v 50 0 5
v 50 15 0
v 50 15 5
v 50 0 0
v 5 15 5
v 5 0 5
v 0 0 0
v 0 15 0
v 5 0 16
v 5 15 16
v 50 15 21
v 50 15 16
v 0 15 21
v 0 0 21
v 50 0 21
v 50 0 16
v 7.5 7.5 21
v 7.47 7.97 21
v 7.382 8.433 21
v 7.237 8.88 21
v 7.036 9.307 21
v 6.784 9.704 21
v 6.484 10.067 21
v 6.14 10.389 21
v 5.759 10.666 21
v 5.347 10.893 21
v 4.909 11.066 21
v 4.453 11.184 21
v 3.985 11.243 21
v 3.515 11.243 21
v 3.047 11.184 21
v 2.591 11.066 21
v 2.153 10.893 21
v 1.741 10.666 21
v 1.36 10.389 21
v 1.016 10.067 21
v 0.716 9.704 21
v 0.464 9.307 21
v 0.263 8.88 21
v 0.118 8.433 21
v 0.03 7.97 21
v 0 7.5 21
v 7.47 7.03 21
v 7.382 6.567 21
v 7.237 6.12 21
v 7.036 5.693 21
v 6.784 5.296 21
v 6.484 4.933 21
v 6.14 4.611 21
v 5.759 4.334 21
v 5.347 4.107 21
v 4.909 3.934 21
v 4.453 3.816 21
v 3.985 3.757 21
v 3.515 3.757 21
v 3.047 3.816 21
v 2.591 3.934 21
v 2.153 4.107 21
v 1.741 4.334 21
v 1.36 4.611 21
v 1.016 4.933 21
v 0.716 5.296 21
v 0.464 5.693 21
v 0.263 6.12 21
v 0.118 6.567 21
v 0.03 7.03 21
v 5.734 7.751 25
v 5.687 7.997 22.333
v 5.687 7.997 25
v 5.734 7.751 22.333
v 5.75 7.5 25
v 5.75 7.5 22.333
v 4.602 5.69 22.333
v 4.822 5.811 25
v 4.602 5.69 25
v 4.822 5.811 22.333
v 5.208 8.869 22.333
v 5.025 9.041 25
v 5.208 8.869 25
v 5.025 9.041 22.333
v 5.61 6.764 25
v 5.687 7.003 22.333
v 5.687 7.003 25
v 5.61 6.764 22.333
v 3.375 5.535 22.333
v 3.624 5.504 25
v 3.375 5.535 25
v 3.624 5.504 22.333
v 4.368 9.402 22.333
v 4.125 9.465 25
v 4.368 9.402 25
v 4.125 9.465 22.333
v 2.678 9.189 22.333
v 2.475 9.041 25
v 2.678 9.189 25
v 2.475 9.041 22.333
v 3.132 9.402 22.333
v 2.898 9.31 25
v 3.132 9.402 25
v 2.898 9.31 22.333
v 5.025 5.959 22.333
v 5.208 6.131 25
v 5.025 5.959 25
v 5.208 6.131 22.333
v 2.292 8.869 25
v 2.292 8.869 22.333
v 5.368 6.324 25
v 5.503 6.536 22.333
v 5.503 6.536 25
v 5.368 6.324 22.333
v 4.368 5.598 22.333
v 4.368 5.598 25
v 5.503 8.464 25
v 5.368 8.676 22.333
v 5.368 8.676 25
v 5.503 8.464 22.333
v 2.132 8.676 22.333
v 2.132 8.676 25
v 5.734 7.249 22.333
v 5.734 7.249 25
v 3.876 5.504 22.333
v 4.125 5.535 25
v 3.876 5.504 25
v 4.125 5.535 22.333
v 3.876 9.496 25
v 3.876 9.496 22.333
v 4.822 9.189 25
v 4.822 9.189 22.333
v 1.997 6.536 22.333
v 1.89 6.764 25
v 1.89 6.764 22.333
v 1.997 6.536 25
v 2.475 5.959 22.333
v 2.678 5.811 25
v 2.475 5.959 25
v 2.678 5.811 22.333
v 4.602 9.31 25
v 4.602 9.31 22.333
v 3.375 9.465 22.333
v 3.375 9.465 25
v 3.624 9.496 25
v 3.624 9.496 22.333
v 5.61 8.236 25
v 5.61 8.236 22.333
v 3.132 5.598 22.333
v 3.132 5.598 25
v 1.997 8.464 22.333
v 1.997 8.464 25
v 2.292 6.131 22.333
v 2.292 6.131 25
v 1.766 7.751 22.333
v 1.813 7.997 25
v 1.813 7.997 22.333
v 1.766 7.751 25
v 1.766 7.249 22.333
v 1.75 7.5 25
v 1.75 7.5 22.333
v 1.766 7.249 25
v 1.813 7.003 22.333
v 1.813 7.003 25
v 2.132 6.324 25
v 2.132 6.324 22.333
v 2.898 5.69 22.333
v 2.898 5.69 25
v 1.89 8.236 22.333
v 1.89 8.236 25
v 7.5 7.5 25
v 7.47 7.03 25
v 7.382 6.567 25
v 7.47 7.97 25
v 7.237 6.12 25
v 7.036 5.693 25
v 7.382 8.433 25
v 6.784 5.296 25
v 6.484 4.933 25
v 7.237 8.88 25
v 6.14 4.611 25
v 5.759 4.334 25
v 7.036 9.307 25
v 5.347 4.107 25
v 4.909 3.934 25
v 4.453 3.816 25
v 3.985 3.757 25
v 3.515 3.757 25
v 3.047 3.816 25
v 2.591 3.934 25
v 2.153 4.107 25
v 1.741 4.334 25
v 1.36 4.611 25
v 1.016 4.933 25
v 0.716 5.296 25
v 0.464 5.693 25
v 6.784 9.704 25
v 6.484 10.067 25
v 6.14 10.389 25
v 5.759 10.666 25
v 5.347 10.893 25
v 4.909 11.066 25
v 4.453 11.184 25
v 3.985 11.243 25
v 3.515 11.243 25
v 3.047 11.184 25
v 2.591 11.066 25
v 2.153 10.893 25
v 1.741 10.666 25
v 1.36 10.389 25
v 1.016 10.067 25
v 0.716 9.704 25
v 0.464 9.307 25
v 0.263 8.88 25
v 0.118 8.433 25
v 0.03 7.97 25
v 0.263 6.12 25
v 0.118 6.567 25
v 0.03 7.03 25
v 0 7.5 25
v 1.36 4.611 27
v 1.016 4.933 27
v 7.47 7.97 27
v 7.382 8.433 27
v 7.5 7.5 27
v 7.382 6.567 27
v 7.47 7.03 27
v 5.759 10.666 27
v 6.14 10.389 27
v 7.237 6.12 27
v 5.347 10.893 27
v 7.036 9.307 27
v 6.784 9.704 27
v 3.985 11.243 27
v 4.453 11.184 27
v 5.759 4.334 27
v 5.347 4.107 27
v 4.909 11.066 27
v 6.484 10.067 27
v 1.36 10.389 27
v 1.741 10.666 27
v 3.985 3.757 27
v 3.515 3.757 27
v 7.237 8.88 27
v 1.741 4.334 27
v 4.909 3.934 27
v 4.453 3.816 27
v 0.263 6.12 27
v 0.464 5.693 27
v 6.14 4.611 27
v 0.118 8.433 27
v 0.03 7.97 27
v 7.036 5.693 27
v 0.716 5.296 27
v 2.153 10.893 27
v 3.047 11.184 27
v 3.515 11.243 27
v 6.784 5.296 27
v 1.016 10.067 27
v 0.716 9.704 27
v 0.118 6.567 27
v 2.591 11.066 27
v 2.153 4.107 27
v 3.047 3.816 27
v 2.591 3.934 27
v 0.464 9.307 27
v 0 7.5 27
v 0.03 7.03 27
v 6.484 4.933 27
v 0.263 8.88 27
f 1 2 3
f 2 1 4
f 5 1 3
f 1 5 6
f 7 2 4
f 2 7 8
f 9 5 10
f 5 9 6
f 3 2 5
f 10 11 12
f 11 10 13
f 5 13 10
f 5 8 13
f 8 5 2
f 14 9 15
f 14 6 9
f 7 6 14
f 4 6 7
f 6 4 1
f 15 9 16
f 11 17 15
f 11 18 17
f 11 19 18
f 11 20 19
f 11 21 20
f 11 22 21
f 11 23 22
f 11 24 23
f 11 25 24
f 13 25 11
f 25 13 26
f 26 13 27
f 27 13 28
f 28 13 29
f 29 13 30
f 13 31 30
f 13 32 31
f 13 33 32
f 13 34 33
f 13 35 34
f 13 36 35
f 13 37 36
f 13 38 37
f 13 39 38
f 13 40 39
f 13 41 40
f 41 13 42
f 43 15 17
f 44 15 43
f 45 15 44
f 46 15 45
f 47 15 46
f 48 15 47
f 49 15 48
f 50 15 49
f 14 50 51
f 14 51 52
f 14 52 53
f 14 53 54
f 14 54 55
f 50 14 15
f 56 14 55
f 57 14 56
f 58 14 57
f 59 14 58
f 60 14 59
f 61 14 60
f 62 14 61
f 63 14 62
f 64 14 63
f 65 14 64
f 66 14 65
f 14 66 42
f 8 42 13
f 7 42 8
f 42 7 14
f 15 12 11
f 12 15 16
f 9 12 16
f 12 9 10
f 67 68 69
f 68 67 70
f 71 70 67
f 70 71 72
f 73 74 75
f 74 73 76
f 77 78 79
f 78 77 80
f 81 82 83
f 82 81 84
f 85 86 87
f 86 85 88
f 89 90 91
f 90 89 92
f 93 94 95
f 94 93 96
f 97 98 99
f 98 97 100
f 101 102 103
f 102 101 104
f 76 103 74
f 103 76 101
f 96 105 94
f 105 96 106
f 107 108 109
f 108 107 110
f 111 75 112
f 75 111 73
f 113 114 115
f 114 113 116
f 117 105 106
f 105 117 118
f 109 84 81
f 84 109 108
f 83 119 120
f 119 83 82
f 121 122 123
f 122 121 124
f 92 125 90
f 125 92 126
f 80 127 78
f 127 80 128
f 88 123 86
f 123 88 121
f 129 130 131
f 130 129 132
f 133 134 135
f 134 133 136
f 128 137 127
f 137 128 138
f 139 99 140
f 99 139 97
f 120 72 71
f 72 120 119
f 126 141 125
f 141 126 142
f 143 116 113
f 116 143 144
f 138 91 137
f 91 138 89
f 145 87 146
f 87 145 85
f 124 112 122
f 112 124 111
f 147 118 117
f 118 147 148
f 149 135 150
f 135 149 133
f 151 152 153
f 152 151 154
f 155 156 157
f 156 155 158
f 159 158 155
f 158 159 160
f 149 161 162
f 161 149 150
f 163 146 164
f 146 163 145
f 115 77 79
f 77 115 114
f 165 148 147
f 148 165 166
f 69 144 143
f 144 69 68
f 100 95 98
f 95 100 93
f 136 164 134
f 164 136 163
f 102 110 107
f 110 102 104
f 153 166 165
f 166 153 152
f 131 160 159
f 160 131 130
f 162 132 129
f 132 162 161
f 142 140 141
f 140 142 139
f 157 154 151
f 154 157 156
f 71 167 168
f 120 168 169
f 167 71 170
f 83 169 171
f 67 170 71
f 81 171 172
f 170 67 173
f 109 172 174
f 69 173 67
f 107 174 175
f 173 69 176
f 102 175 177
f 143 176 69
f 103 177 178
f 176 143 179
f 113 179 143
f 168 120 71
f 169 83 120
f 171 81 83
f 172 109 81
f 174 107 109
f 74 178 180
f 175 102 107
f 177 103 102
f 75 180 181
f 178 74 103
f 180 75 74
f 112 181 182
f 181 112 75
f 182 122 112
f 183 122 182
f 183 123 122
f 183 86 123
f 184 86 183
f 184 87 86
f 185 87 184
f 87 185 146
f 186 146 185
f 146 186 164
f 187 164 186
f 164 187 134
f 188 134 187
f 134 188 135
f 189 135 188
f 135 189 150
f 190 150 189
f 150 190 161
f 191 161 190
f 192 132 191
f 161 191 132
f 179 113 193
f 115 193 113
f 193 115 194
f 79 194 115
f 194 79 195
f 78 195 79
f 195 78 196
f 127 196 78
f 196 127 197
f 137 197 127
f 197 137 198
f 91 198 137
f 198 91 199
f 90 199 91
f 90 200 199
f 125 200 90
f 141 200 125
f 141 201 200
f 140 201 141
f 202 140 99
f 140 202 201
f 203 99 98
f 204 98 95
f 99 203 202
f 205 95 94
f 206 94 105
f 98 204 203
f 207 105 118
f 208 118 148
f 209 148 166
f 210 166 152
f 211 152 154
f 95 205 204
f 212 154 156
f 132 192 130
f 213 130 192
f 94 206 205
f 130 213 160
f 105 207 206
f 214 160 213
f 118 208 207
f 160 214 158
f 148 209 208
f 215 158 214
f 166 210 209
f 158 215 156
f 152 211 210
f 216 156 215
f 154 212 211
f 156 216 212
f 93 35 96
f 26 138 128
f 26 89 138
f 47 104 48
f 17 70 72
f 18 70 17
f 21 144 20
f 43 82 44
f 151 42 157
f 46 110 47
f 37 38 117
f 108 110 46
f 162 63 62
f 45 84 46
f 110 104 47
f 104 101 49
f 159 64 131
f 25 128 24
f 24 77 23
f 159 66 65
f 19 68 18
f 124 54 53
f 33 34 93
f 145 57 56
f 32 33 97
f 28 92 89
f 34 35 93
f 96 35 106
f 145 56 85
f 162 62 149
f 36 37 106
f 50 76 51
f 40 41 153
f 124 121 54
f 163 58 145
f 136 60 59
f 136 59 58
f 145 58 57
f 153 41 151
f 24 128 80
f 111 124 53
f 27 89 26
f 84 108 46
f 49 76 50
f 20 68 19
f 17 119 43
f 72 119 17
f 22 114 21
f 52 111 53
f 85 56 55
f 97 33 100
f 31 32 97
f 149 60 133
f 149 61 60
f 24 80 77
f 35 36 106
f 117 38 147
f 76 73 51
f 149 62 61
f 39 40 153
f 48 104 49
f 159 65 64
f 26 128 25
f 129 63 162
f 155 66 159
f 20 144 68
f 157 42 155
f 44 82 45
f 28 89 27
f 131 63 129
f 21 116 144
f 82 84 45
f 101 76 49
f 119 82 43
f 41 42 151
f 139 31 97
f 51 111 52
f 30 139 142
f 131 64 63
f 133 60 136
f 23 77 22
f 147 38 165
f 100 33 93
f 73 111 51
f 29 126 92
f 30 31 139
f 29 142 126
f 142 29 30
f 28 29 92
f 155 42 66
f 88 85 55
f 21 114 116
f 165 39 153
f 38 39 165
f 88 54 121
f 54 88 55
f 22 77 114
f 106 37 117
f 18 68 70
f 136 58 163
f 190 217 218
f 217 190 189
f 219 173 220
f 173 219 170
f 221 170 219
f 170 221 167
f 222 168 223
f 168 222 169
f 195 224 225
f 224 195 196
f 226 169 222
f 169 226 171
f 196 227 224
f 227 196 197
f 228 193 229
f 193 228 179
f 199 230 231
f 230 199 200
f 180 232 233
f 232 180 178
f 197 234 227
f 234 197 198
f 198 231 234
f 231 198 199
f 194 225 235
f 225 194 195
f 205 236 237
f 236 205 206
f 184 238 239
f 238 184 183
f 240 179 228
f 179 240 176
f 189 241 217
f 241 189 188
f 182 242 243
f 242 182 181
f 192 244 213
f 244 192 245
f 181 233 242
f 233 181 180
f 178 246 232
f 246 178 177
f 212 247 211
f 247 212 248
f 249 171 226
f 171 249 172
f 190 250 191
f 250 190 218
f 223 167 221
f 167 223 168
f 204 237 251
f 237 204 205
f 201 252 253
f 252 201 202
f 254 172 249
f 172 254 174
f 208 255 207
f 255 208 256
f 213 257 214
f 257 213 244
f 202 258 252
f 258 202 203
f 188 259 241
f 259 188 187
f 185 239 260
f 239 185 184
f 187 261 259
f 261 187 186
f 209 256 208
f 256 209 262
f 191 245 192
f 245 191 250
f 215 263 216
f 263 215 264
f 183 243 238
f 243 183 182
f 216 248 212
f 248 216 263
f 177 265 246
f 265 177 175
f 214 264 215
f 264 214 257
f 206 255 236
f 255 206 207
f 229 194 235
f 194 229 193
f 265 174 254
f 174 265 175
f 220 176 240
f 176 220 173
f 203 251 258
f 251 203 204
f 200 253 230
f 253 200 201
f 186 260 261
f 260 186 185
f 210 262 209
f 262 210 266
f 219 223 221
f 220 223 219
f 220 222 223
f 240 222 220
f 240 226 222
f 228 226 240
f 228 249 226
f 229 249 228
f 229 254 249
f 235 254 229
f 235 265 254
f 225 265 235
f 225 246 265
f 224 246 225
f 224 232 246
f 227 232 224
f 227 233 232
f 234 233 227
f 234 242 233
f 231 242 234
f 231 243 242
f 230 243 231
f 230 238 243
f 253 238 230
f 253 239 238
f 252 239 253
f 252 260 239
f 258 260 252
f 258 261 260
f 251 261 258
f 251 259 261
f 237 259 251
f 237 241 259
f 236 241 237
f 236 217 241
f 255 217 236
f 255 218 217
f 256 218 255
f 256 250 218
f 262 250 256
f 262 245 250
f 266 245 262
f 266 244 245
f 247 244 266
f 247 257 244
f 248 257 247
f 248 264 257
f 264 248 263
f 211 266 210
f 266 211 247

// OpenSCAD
//
// IKEA Ivar Hook
// This is hook for hanging electronics or other stuff on vertical planks
// Originally designed to hang my Fritz!Box Router on the side of a IKEA
// Ivar shelf.
//
// 2018 by David Riedl
// It's my first build with OpenSCAD. Enjoy remixing it!


// Thickness of the IVAR wooden support (a.k.a. inner height)
innercavityZ = 11;

// Material thickness
hookthickness = 5;

// Length of the two hook ends
hookX = 45;
// Width of the whole hook
hookY = 15;

// Width of the hole for the screw head
mushroomhead = 7.5;
// Width of the narrow part of the hole
mushroomstem = 4;

// These two values should be the total depth of the hole of the device
mushroomstemheight = 4;
mushroomheadheight = 2;

$fn = 50; 

union () {
 //rotating for optimal printing (optional)
 //rotate (a = [0,-90,0]){
    
    //bottom horizontal beam
    translate ([hookthickness,0,0]) {
        cube ([hookX,hookY,hookthickness], center = false);
        }
    //vertical beam
    cube ([hookthickness,hookY,hookthickness * 2 + innercavityZ], center = false);
    //top horizontal beam
    translate ([hookthickness,0,hookthickness + innercavityZ]) {
        cube ([hookX,hookY,hookthickness], center = false);
        }
    
    //hook for device   
    //stem
    translate ([mushroomhead / 2 ,hookY / 2,hookthickness * 2 + innercavityZ]) { 
        cylinder (mushroomstemheight, mushroomstem / 2,mushroomstem / 2 , center = false);
        }
        
    //detail1
    translate ([mushroomhead / 2 ,hookY / 2,hookthickness * 2 + innercavityZ]) { 
        cylinder (mushroomstemheight /3, mushroomhead /2,mushroomstem /2 , center = false);
        }

    //head
    translate ([mushroomhead / 2 ,hookY / 2,hookthickness * 2 + innercavityZ + mushroomstemheight]) {
        cylinder (mushroomheadheight,mushroomhead / 2,mushroomhead / 2, center = false);
        }
}

//}
